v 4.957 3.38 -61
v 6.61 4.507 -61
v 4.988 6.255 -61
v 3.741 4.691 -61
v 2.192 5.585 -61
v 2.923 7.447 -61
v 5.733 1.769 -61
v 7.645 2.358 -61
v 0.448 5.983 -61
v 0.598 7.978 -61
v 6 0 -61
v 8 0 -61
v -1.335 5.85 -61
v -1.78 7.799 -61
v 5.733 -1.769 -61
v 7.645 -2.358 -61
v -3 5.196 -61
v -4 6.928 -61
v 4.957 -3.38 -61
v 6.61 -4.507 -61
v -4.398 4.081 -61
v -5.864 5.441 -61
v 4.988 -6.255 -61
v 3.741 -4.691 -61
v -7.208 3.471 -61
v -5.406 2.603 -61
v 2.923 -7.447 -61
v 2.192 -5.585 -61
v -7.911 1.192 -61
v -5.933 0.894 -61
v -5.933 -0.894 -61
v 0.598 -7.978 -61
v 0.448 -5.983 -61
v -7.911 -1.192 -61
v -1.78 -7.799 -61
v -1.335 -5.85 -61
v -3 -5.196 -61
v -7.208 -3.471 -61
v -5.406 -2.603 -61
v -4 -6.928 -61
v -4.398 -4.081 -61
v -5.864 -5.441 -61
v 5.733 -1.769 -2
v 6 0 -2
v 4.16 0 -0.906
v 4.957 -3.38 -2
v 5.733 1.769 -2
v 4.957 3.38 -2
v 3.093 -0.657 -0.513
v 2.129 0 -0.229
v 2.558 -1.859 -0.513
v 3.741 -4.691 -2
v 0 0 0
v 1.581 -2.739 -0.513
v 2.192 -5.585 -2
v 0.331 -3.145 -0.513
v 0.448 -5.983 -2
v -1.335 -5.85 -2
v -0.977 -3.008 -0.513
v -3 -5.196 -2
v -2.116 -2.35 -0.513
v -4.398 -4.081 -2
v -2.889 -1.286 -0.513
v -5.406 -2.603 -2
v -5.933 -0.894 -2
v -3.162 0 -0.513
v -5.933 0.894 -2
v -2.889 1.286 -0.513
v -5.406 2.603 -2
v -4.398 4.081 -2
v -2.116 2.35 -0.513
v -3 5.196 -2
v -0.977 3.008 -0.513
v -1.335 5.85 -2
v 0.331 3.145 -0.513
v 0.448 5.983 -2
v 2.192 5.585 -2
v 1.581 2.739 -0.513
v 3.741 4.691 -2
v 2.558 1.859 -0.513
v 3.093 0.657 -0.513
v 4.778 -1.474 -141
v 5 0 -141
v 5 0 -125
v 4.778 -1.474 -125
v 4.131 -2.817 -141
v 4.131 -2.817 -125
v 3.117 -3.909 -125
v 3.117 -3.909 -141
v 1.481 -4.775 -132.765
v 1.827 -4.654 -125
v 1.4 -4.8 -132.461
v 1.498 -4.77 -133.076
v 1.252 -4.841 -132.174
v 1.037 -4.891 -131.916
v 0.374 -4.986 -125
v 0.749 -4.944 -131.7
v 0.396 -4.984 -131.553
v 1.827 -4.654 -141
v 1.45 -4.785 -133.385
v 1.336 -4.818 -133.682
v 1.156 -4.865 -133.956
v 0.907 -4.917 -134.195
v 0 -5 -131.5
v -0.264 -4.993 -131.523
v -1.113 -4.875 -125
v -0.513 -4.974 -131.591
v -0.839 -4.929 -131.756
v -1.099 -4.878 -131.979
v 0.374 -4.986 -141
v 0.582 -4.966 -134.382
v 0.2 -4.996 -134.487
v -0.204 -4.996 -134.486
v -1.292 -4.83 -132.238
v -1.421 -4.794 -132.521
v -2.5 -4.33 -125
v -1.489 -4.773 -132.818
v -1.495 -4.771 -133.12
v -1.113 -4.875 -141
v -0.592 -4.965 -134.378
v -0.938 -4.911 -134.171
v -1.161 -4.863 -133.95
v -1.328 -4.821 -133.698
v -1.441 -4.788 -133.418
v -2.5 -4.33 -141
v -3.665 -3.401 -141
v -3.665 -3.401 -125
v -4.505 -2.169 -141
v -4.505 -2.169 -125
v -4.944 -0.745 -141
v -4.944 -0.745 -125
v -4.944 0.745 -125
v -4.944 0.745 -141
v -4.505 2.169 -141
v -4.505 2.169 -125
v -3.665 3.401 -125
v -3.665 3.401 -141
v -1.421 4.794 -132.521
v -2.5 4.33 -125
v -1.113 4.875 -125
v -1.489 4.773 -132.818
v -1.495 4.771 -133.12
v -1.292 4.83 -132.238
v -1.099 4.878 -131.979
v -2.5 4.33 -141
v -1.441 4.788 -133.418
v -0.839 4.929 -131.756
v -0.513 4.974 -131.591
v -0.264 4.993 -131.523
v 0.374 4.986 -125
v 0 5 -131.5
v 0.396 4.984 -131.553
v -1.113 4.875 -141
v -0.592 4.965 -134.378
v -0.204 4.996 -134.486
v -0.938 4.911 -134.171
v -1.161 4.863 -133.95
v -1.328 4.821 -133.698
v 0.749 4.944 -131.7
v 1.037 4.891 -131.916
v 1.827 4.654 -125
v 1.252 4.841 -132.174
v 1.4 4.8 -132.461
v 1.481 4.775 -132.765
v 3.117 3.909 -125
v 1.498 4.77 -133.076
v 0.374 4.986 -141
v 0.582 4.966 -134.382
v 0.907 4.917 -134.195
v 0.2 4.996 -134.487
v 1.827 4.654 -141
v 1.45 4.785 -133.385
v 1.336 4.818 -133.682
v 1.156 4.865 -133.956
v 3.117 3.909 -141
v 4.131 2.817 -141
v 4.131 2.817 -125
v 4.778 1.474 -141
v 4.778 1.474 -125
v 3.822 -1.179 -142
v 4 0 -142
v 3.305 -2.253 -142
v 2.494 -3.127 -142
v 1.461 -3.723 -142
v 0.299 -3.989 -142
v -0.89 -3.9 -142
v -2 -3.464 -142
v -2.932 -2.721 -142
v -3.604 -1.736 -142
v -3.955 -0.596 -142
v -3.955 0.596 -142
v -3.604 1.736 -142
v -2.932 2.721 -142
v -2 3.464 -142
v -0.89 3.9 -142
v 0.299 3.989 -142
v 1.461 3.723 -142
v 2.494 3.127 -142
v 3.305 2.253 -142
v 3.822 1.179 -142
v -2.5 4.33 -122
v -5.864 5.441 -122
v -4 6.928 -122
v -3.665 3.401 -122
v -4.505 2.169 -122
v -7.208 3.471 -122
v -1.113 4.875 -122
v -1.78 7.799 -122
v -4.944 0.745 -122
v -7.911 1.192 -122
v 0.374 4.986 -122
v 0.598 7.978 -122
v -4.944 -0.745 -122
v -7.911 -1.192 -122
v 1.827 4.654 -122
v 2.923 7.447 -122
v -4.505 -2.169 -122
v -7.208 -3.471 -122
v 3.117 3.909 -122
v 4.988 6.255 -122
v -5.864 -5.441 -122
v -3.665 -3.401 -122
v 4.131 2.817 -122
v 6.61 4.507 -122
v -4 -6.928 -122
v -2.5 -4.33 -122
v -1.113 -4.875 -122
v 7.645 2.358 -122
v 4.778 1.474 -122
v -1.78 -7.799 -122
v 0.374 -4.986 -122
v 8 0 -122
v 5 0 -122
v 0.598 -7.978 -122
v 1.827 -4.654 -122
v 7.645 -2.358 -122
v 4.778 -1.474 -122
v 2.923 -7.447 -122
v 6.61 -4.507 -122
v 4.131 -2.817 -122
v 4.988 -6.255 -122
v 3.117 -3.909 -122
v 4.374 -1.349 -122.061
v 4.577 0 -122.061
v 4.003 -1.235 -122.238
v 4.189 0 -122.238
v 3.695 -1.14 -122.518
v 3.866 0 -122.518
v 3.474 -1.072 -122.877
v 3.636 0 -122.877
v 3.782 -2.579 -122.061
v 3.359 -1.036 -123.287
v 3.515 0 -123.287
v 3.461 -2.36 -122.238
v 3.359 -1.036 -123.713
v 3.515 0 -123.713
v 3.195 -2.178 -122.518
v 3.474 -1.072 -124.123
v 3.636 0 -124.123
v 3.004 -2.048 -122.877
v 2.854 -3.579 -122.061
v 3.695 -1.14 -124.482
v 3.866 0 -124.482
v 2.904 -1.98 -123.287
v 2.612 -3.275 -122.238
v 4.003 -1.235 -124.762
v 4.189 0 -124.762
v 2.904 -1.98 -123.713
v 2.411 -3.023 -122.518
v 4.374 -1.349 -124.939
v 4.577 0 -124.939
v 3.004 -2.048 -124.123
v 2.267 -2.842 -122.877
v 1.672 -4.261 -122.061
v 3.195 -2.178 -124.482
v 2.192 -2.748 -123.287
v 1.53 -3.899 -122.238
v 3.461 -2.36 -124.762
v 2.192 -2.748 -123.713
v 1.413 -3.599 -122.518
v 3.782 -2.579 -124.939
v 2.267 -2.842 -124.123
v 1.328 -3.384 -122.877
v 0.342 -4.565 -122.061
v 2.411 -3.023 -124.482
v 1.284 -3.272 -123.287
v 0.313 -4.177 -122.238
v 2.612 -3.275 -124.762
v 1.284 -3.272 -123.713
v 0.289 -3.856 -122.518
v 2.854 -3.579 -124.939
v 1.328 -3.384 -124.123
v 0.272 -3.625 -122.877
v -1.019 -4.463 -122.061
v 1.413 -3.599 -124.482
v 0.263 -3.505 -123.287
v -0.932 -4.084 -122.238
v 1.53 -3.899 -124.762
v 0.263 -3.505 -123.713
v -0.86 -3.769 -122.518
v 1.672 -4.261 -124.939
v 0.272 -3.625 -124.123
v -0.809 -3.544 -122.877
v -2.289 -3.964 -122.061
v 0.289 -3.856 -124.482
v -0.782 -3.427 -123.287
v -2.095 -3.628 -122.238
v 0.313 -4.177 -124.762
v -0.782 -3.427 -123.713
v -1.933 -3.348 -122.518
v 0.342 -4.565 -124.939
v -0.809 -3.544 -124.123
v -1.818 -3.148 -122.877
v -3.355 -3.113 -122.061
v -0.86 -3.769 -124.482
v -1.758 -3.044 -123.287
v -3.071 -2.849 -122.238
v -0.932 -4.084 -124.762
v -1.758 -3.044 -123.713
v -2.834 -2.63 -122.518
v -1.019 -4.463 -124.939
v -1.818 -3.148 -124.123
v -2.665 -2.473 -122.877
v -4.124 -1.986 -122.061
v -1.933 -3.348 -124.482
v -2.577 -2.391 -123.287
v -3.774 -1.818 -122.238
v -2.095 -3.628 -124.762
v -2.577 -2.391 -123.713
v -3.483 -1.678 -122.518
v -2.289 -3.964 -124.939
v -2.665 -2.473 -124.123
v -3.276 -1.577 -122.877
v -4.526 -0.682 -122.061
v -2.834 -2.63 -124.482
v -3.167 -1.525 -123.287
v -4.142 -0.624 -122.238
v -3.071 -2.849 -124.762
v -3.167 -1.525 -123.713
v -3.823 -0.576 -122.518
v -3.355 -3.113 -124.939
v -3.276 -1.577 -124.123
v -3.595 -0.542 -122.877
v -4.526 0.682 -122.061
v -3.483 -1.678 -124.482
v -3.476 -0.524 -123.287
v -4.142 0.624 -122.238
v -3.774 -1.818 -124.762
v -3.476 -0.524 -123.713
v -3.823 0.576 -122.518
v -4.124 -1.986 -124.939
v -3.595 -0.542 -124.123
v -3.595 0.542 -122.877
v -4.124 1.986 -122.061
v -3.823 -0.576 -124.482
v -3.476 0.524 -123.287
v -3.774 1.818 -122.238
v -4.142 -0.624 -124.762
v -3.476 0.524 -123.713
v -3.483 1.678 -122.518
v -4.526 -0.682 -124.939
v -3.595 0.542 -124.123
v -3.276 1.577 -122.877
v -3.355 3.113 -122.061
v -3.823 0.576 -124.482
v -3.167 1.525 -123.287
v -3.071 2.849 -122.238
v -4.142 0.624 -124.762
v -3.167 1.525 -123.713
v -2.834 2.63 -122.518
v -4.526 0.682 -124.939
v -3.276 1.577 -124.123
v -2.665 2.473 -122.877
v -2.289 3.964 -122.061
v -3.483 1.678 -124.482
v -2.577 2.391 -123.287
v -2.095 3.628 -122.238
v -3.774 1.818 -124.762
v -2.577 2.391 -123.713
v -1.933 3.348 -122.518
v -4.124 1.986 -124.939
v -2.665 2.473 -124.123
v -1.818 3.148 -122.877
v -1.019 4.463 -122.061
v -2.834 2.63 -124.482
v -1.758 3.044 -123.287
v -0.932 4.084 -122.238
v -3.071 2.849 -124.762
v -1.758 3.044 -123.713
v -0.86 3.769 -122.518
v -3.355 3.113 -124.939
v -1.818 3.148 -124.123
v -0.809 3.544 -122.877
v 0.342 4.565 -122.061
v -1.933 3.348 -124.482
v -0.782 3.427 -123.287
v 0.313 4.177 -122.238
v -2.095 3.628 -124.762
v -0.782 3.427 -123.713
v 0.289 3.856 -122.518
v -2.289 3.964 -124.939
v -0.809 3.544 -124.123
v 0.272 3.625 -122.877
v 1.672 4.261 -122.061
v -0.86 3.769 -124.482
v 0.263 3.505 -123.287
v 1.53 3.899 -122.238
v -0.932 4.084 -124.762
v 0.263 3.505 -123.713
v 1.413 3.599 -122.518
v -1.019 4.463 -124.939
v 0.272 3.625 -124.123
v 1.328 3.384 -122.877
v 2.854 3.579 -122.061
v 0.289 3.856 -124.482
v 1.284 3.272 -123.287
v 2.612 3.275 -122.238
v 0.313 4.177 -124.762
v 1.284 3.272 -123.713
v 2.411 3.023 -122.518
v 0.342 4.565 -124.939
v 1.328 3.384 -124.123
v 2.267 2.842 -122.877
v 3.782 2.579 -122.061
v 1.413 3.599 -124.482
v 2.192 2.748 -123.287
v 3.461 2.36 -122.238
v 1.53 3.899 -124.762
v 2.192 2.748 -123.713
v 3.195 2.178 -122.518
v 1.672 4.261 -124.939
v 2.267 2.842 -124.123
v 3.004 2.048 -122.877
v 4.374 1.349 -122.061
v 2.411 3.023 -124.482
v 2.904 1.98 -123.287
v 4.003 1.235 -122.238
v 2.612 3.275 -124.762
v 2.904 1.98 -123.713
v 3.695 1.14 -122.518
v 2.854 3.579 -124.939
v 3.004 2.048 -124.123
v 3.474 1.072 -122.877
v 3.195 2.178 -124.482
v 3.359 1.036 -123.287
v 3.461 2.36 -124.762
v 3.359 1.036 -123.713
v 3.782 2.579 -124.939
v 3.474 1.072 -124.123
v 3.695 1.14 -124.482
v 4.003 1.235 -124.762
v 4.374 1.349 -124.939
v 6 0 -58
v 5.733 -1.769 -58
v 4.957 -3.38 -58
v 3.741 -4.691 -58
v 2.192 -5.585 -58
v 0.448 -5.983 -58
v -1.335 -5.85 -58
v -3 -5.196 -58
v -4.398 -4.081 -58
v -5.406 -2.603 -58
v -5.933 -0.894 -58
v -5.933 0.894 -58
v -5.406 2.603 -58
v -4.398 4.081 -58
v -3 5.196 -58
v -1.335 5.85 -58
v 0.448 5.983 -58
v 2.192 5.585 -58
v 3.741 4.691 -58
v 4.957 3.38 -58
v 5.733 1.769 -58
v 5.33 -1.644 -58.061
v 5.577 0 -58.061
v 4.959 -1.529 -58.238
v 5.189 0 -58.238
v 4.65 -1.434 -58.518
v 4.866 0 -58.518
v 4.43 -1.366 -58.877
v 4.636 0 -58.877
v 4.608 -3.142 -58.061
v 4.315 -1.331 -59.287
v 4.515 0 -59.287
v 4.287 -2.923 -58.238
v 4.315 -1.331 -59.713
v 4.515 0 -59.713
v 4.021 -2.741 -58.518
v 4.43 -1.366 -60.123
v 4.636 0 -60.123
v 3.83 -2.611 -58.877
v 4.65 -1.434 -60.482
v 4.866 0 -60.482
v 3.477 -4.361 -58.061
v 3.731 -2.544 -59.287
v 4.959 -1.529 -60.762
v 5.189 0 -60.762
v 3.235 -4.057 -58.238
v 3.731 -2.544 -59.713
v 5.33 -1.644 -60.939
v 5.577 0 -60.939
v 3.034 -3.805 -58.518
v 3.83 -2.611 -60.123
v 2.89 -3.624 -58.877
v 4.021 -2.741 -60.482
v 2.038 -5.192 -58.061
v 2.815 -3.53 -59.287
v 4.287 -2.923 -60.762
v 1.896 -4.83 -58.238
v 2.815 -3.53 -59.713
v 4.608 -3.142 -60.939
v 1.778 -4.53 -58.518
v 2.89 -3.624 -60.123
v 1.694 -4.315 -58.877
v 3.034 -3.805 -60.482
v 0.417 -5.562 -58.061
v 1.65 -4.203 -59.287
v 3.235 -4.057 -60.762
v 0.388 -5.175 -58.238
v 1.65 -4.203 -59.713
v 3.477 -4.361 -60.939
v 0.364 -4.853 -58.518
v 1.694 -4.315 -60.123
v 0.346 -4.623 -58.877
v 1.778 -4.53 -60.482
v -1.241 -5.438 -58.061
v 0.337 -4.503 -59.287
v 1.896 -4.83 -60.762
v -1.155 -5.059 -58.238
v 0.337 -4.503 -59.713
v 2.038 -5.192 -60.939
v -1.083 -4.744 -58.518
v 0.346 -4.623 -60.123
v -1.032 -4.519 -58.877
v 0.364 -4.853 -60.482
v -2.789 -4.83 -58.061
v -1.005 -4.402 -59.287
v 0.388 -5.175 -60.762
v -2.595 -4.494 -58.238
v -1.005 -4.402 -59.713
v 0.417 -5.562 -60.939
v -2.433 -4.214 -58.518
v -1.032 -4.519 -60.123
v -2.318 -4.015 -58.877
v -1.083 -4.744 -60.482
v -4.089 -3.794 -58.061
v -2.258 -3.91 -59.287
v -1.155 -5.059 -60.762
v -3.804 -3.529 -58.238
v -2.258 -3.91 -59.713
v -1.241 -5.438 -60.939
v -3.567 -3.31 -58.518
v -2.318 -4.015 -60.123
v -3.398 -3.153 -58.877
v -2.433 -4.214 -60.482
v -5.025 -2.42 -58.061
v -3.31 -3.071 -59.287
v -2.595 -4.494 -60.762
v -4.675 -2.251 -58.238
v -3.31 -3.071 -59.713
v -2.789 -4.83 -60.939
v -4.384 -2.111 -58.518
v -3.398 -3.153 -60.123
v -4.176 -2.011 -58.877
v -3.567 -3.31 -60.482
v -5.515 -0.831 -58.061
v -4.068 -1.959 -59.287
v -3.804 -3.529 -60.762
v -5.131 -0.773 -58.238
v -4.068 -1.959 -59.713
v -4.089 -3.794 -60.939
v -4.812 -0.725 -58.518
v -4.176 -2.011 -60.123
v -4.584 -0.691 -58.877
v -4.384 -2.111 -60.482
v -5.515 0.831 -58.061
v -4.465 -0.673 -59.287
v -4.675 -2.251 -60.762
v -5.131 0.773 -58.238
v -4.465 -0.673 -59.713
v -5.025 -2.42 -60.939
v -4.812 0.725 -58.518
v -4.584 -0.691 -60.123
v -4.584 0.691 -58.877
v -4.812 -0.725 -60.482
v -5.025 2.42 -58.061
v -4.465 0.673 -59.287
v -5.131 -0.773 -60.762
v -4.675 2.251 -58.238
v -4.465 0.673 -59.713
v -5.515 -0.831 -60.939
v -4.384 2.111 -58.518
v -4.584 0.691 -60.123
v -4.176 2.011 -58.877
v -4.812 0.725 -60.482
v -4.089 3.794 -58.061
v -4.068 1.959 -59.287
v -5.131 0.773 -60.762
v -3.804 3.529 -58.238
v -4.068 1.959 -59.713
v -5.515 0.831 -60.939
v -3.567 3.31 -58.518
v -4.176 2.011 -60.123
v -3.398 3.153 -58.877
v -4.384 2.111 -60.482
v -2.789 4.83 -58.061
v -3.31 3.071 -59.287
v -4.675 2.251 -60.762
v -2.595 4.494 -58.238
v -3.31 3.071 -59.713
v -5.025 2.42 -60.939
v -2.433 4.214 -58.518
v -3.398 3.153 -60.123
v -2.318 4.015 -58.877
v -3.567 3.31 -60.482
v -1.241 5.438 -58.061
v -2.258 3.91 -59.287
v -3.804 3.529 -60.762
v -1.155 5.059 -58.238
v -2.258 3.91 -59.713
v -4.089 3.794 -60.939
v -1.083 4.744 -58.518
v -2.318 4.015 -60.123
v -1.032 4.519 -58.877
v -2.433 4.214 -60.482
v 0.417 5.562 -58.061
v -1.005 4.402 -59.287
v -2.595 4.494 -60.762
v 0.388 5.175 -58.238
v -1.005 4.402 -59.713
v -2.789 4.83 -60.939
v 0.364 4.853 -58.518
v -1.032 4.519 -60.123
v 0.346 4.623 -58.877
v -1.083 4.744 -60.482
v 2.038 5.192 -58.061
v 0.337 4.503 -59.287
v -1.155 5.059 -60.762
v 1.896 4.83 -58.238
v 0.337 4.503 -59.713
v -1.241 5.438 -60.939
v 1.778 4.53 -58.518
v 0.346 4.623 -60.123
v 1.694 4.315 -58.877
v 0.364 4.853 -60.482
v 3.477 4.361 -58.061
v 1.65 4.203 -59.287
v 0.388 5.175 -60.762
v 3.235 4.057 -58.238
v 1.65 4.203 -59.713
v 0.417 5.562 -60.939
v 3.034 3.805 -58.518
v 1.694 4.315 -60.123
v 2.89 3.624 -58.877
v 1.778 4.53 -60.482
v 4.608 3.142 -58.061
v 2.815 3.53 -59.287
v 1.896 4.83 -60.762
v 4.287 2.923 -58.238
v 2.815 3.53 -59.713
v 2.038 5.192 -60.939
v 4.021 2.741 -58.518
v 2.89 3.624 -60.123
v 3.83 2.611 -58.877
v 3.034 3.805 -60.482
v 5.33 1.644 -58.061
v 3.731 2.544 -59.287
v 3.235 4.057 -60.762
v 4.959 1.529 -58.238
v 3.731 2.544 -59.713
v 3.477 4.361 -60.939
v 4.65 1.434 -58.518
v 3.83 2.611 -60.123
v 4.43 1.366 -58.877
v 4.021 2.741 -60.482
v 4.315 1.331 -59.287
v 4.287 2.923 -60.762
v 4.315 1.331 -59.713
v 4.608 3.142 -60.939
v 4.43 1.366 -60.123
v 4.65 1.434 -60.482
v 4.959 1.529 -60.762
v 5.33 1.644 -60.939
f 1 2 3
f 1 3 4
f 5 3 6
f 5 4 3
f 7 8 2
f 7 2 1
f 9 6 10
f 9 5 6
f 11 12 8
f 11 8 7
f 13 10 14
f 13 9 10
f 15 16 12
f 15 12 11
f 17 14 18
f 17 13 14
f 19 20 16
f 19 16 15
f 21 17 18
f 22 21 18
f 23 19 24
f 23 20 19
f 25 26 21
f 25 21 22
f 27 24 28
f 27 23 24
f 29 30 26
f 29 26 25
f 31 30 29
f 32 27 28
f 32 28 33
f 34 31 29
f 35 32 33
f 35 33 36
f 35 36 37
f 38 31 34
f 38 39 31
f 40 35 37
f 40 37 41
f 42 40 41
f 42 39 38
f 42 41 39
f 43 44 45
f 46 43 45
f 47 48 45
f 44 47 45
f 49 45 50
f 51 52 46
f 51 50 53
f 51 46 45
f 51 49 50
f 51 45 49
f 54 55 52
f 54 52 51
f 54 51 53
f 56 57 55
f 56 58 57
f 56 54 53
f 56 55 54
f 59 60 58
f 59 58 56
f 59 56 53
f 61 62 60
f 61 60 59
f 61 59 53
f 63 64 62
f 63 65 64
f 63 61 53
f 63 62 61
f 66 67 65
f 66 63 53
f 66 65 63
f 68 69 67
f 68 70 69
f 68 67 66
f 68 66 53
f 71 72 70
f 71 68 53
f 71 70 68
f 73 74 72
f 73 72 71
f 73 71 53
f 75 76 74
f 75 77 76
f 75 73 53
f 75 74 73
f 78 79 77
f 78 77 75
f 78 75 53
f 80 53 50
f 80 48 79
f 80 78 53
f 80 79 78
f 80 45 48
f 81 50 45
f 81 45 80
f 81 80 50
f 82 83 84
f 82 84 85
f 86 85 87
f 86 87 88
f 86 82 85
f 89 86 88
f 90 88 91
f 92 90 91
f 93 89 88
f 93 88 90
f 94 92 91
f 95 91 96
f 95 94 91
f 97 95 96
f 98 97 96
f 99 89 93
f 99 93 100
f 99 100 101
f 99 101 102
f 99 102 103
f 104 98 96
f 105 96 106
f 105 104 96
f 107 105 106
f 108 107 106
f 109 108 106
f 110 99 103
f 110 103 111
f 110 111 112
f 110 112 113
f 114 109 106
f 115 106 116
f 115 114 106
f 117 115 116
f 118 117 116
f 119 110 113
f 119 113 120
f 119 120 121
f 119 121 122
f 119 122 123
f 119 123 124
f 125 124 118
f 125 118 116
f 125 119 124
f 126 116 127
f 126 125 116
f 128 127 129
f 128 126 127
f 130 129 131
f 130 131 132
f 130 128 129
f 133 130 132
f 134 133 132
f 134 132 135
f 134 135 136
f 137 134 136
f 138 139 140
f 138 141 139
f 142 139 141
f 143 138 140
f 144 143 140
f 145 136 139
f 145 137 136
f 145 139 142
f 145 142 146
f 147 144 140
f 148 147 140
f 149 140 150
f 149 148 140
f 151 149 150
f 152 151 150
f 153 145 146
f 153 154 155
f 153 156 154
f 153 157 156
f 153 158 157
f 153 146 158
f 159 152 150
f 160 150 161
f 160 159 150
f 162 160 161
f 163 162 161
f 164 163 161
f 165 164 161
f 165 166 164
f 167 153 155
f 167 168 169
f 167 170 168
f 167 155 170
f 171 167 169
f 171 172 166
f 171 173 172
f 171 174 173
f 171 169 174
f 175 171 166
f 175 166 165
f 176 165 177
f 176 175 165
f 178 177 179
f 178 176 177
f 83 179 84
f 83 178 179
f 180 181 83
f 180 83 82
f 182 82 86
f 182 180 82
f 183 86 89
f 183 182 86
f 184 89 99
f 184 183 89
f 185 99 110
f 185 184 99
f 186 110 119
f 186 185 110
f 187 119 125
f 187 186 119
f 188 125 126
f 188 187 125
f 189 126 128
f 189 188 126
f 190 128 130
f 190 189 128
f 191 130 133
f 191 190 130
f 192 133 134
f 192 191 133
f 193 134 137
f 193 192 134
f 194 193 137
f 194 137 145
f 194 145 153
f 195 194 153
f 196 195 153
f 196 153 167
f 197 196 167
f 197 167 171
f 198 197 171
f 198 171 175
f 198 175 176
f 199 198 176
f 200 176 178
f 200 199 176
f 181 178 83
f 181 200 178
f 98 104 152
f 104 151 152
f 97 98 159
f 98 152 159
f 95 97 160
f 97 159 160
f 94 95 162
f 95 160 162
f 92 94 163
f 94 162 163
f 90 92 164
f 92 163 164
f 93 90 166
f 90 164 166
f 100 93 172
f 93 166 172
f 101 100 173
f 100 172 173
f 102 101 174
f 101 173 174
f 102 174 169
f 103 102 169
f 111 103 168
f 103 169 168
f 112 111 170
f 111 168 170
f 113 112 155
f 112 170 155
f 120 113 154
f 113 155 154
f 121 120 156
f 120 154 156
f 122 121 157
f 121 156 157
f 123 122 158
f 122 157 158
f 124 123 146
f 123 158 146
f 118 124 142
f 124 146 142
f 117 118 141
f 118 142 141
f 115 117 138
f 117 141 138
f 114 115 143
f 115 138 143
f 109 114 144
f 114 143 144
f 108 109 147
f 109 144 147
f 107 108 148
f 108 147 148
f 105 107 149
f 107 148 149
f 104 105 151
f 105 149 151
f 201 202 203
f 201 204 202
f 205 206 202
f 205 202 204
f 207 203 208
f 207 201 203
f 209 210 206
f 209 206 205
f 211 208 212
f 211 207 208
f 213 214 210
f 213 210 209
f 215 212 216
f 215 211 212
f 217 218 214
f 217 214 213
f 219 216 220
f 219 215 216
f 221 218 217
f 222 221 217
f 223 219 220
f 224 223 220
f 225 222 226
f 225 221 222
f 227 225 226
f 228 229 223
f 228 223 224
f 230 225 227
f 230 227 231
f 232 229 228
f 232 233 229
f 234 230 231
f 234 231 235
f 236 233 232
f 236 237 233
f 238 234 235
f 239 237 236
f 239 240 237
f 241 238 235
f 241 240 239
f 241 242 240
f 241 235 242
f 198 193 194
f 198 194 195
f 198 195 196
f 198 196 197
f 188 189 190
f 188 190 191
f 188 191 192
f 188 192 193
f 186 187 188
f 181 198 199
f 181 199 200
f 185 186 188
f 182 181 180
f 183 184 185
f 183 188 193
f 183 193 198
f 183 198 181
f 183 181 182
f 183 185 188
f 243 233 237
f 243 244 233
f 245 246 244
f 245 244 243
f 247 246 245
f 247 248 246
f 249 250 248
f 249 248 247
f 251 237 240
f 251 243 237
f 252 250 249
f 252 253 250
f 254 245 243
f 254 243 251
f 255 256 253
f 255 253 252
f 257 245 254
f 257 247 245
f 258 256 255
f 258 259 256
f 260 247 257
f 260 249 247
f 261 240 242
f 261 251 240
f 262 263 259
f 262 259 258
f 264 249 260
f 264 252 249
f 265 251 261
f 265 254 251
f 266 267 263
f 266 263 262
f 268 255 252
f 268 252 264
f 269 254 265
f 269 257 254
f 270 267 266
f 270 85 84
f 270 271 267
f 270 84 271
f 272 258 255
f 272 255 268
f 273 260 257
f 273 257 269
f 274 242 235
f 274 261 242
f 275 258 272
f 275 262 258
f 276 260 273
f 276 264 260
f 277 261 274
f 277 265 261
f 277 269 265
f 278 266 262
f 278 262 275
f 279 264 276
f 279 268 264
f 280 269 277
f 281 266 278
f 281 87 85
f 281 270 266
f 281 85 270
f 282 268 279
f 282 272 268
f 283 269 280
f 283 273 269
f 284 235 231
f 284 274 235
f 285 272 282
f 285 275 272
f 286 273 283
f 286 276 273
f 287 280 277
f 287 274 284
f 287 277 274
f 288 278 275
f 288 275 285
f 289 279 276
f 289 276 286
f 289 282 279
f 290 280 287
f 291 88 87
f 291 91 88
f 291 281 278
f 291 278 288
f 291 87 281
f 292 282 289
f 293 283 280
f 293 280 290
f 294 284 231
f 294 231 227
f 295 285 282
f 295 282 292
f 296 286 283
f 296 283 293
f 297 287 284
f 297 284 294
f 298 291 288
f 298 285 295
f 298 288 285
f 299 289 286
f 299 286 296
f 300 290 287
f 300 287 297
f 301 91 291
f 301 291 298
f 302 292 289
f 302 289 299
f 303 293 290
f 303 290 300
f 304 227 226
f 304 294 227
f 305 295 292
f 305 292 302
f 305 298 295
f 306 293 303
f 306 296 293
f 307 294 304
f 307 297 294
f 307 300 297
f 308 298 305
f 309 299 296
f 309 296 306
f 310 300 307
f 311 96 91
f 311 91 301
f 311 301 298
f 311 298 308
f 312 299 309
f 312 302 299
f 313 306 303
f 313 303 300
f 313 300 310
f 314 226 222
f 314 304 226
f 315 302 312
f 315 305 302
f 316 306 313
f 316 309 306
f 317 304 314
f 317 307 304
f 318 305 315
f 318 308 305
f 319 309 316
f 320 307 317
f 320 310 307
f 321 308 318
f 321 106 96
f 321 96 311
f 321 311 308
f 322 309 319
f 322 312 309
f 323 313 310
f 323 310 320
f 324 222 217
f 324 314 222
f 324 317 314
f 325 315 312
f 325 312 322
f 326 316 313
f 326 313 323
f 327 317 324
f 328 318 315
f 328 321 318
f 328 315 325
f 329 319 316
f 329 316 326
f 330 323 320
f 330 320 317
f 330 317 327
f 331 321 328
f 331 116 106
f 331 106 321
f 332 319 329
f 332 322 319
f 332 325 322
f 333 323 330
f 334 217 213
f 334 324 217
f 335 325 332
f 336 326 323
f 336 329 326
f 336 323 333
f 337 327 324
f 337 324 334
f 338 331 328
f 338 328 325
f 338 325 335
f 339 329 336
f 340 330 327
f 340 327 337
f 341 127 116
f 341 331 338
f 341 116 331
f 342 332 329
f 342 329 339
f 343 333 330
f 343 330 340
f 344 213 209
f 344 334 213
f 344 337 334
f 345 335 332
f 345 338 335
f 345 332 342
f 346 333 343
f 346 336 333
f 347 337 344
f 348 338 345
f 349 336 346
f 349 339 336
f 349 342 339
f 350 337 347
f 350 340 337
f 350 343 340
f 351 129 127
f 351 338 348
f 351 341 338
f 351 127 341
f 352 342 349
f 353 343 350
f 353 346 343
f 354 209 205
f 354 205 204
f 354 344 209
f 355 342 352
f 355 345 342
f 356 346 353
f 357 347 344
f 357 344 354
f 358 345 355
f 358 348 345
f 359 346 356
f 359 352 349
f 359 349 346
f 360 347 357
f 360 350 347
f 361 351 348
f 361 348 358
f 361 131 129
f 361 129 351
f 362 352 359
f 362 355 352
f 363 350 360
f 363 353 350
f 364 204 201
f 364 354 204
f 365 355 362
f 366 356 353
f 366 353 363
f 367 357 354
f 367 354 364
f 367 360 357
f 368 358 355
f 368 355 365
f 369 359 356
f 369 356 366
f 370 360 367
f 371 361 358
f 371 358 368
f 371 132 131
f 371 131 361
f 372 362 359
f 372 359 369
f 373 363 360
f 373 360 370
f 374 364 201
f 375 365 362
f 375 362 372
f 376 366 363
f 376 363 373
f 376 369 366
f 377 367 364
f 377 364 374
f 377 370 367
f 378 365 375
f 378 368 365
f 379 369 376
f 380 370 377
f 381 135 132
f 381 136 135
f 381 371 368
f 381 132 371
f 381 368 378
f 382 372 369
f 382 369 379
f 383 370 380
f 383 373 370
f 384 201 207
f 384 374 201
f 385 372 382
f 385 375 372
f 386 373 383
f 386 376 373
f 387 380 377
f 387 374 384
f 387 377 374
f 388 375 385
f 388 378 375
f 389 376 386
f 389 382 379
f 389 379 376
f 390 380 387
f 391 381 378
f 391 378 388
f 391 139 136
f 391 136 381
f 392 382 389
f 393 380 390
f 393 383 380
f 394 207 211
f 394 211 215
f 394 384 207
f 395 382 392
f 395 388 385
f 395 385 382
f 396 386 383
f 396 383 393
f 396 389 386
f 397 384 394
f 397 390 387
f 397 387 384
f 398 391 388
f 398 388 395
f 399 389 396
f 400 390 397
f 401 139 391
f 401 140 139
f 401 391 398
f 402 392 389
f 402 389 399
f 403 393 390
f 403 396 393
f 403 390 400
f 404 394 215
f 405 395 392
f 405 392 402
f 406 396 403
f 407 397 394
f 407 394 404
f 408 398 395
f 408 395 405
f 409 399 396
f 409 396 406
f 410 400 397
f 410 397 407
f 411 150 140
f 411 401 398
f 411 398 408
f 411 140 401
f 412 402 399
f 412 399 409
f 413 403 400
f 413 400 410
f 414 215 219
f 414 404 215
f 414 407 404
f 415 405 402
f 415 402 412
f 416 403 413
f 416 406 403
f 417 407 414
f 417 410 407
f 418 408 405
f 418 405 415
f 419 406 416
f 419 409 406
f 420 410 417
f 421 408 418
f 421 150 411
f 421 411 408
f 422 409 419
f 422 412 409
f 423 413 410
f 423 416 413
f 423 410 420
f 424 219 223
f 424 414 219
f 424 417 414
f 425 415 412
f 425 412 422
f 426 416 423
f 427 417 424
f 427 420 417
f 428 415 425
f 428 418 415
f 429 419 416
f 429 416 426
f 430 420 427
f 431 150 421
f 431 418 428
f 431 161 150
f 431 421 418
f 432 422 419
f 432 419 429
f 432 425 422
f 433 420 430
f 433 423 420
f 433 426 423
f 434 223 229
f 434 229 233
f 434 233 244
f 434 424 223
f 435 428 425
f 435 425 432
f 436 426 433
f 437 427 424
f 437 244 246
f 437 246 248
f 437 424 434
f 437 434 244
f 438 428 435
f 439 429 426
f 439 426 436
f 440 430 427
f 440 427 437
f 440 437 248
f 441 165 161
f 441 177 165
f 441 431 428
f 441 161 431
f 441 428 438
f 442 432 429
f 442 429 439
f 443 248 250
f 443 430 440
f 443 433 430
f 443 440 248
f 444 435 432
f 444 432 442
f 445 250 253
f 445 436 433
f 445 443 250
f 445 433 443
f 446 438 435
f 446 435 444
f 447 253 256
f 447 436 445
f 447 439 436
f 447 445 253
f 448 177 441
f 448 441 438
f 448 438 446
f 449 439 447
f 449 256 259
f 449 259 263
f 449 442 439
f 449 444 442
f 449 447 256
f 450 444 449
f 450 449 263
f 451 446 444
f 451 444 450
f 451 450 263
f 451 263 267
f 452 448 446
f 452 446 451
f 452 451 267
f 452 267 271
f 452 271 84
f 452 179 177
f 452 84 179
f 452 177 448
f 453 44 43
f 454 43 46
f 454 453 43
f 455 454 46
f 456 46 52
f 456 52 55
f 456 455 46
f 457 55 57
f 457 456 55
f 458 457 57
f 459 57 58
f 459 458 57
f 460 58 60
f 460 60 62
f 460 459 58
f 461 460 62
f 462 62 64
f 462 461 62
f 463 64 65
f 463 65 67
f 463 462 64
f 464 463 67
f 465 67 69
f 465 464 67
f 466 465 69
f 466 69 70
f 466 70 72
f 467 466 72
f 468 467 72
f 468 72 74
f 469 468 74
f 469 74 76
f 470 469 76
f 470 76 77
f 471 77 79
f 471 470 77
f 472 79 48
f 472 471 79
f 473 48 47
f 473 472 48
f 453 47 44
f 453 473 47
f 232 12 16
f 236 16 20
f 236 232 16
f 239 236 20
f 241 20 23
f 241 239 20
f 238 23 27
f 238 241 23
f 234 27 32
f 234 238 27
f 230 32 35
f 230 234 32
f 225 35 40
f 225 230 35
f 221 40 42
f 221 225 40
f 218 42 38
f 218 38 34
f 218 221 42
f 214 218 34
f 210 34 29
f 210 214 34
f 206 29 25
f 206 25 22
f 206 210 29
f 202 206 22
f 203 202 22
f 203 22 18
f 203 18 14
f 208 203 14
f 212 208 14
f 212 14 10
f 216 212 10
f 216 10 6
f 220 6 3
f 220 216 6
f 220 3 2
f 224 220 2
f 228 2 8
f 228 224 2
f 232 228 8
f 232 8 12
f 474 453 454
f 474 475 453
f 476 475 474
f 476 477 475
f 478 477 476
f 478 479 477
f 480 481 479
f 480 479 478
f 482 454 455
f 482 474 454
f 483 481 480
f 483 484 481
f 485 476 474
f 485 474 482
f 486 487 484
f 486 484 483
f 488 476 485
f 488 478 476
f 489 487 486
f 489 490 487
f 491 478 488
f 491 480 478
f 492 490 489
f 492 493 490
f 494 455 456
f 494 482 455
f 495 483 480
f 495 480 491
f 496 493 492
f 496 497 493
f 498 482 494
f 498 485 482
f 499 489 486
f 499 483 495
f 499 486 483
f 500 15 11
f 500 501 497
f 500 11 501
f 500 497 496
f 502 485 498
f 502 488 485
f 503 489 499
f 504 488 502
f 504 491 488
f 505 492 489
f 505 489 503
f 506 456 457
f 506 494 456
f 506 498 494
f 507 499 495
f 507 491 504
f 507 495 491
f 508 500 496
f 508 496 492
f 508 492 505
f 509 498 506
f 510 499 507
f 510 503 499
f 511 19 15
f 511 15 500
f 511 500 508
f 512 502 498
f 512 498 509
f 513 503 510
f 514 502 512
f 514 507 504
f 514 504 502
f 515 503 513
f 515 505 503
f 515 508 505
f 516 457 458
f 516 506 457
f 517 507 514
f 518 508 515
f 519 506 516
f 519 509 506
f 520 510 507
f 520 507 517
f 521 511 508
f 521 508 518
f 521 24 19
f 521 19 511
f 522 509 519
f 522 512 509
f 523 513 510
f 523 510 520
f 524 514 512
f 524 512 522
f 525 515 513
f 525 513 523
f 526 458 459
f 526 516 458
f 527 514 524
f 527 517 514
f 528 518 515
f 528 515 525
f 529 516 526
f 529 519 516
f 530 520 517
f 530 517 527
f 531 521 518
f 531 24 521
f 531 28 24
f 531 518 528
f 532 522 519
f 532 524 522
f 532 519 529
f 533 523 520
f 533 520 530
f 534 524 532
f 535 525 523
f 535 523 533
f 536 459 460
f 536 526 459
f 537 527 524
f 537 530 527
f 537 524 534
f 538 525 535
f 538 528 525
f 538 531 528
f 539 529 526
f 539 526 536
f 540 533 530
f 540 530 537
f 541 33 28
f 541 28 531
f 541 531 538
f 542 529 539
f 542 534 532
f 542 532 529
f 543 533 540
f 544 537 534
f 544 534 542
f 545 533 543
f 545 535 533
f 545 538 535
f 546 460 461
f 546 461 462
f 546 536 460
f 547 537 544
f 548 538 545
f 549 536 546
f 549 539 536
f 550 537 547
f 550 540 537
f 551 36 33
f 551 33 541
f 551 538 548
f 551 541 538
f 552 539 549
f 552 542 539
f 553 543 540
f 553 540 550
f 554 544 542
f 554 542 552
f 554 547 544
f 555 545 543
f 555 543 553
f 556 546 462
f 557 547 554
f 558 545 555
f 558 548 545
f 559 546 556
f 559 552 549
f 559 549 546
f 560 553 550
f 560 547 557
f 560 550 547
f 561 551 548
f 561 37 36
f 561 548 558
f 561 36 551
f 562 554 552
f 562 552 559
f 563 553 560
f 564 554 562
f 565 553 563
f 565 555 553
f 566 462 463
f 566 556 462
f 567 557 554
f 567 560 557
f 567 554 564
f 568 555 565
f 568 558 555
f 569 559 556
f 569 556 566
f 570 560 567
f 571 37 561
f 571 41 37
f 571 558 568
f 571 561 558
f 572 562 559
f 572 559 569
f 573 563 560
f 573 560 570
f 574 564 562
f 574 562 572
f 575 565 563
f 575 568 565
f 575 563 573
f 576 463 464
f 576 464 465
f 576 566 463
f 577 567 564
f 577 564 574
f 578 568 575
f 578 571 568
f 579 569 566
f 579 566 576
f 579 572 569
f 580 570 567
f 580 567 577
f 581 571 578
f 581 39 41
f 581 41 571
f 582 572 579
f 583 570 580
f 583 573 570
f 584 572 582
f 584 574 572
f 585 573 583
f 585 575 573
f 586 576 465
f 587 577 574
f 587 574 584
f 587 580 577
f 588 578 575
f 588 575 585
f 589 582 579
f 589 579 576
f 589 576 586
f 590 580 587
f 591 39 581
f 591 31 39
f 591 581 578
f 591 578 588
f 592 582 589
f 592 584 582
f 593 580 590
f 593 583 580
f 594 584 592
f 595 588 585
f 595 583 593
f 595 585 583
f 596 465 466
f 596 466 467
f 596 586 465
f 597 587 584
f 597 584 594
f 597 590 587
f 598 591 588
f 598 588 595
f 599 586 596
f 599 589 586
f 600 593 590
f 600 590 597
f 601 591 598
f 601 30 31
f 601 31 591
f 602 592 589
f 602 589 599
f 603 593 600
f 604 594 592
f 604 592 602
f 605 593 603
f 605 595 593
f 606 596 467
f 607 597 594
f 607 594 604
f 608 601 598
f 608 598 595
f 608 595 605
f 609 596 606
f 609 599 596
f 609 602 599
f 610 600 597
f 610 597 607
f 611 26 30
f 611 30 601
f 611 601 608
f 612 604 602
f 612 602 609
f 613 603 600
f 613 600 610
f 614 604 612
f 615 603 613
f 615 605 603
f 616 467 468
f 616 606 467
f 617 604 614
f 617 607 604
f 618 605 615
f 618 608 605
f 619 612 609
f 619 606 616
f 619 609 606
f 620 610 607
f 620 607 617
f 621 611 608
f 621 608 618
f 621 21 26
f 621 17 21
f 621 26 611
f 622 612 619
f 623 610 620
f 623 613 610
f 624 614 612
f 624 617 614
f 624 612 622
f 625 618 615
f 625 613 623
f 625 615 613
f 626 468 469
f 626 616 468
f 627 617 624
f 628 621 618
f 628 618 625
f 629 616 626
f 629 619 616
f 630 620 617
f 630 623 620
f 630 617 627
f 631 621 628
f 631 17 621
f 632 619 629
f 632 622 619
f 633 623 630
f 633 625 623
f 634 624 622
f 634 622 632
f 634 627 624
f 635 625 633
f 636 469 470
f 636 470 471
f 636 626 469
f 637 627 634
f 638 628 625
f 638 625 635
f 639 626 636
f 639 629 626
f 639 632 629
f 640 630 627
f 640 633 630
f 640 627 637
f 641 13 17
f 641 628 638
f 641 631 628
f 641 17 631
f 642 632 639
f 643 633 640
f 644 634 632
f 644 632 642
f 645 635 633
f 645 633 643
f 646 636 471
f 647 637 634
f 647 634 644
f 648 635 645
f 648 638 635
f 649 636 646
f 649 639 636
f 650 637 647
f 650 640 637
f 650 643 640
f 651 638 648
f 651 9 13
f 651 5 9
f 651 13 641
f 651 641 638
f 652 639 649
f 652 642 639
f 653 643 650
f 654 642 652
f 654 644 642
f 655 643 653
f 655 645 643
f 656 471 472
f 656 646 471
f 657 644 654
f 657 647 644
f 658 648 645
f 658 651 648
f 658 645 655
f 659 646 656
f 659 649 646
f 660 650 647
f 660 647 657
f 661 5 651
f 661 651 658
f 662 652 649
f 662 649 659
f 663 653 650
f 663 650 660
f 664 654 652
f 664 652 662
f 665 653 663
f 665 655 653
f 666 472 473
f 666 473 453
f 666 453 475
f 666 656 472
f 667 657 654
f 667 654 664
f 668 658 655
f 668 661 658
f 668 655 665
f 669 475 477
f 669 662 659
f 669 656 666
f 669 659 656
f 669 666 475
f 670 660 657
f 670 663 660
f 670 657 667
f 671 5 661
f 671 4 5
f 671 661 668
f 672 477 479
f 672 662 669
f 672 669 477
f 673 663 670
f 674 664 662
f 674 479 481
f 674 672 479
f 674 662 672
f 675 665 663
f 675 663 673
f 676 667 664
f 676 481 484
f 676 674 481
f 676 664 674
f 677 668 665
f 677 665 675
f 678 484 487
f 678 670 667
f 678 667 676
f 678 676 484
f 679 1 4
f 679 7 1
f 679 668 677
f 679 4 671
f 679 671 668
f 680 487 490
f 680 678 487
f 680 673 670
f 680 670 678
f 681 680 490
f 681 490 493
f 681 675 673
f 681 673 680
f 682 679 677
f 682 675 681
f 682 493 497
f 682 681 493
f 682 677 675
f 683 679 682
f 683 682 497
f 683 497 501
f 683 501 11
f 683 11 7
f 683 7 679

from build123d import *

# Parameters (mm, degrees)
SKETCH_2_R          = 1.5
CUT_EXTRUDE_1_DEPTH = 10
CHAMFER_1_SIZE      = 1


with BuildPart() as part:
    # 草圖1 → 旋轉1 (revolve)
    with BuildSketch(Plane(origin=(0, 0, 0), x_dir=(0, 0, -1), z_dir=(1, 0, 0)), mode=Mode.PRIVATE) as revolve_1_sk:
        with BuildLine():
            Line((2, 6), (58, 6))
            ThreePointArc((58, 6), (59.5, 4.5), (61, 6))
            Line((61, 6), (61, 8))
            Line((61, 8), (122, 8))
            Line((122, 8), (122, 5))
            ThreePointArc((122, 5), (123.5, 3.5), (125, 5))
            Line((125, 5), (142, 5))
            Line((142, 5), (142, 0))
            Line((142, 0), (0, 0))
            ThreePointArc((0, 0), (0.513167019, 3.16227766), (2, 6))
        make_face()
    revolve(revolve_1_sk.sketch.rotate(Axis((0, 0, 0), (0, 0, -1)), 90), axis=Axis((0, 0, 0), (0, 0, -1)))

    # 草圖2 → 除料-伸長1 (cut, symmetric)
    with BuildSketch(Plane(origin=(0, 0, 0), x_dir=(1, 0, 0), z_dir=(0, 1, 0))):
        with Locations(Location((0, 133, 0), (0, 0, 270))):
            Circle(SKETCH_2_R)
    extrude(amount=CUT_EXTRUDE_1_DEPTH, both=True, mode=Mode.SUBTRACT)

    # 導角1
    chamfer_1_edges = [part.edges().sort_by_distance(p)[0] for p in [
        (-5, 0, -142),
    ]]
    chamfer(chamfer_1_edges, length=CHAMFER_1_SIZE)


solid = part.part
